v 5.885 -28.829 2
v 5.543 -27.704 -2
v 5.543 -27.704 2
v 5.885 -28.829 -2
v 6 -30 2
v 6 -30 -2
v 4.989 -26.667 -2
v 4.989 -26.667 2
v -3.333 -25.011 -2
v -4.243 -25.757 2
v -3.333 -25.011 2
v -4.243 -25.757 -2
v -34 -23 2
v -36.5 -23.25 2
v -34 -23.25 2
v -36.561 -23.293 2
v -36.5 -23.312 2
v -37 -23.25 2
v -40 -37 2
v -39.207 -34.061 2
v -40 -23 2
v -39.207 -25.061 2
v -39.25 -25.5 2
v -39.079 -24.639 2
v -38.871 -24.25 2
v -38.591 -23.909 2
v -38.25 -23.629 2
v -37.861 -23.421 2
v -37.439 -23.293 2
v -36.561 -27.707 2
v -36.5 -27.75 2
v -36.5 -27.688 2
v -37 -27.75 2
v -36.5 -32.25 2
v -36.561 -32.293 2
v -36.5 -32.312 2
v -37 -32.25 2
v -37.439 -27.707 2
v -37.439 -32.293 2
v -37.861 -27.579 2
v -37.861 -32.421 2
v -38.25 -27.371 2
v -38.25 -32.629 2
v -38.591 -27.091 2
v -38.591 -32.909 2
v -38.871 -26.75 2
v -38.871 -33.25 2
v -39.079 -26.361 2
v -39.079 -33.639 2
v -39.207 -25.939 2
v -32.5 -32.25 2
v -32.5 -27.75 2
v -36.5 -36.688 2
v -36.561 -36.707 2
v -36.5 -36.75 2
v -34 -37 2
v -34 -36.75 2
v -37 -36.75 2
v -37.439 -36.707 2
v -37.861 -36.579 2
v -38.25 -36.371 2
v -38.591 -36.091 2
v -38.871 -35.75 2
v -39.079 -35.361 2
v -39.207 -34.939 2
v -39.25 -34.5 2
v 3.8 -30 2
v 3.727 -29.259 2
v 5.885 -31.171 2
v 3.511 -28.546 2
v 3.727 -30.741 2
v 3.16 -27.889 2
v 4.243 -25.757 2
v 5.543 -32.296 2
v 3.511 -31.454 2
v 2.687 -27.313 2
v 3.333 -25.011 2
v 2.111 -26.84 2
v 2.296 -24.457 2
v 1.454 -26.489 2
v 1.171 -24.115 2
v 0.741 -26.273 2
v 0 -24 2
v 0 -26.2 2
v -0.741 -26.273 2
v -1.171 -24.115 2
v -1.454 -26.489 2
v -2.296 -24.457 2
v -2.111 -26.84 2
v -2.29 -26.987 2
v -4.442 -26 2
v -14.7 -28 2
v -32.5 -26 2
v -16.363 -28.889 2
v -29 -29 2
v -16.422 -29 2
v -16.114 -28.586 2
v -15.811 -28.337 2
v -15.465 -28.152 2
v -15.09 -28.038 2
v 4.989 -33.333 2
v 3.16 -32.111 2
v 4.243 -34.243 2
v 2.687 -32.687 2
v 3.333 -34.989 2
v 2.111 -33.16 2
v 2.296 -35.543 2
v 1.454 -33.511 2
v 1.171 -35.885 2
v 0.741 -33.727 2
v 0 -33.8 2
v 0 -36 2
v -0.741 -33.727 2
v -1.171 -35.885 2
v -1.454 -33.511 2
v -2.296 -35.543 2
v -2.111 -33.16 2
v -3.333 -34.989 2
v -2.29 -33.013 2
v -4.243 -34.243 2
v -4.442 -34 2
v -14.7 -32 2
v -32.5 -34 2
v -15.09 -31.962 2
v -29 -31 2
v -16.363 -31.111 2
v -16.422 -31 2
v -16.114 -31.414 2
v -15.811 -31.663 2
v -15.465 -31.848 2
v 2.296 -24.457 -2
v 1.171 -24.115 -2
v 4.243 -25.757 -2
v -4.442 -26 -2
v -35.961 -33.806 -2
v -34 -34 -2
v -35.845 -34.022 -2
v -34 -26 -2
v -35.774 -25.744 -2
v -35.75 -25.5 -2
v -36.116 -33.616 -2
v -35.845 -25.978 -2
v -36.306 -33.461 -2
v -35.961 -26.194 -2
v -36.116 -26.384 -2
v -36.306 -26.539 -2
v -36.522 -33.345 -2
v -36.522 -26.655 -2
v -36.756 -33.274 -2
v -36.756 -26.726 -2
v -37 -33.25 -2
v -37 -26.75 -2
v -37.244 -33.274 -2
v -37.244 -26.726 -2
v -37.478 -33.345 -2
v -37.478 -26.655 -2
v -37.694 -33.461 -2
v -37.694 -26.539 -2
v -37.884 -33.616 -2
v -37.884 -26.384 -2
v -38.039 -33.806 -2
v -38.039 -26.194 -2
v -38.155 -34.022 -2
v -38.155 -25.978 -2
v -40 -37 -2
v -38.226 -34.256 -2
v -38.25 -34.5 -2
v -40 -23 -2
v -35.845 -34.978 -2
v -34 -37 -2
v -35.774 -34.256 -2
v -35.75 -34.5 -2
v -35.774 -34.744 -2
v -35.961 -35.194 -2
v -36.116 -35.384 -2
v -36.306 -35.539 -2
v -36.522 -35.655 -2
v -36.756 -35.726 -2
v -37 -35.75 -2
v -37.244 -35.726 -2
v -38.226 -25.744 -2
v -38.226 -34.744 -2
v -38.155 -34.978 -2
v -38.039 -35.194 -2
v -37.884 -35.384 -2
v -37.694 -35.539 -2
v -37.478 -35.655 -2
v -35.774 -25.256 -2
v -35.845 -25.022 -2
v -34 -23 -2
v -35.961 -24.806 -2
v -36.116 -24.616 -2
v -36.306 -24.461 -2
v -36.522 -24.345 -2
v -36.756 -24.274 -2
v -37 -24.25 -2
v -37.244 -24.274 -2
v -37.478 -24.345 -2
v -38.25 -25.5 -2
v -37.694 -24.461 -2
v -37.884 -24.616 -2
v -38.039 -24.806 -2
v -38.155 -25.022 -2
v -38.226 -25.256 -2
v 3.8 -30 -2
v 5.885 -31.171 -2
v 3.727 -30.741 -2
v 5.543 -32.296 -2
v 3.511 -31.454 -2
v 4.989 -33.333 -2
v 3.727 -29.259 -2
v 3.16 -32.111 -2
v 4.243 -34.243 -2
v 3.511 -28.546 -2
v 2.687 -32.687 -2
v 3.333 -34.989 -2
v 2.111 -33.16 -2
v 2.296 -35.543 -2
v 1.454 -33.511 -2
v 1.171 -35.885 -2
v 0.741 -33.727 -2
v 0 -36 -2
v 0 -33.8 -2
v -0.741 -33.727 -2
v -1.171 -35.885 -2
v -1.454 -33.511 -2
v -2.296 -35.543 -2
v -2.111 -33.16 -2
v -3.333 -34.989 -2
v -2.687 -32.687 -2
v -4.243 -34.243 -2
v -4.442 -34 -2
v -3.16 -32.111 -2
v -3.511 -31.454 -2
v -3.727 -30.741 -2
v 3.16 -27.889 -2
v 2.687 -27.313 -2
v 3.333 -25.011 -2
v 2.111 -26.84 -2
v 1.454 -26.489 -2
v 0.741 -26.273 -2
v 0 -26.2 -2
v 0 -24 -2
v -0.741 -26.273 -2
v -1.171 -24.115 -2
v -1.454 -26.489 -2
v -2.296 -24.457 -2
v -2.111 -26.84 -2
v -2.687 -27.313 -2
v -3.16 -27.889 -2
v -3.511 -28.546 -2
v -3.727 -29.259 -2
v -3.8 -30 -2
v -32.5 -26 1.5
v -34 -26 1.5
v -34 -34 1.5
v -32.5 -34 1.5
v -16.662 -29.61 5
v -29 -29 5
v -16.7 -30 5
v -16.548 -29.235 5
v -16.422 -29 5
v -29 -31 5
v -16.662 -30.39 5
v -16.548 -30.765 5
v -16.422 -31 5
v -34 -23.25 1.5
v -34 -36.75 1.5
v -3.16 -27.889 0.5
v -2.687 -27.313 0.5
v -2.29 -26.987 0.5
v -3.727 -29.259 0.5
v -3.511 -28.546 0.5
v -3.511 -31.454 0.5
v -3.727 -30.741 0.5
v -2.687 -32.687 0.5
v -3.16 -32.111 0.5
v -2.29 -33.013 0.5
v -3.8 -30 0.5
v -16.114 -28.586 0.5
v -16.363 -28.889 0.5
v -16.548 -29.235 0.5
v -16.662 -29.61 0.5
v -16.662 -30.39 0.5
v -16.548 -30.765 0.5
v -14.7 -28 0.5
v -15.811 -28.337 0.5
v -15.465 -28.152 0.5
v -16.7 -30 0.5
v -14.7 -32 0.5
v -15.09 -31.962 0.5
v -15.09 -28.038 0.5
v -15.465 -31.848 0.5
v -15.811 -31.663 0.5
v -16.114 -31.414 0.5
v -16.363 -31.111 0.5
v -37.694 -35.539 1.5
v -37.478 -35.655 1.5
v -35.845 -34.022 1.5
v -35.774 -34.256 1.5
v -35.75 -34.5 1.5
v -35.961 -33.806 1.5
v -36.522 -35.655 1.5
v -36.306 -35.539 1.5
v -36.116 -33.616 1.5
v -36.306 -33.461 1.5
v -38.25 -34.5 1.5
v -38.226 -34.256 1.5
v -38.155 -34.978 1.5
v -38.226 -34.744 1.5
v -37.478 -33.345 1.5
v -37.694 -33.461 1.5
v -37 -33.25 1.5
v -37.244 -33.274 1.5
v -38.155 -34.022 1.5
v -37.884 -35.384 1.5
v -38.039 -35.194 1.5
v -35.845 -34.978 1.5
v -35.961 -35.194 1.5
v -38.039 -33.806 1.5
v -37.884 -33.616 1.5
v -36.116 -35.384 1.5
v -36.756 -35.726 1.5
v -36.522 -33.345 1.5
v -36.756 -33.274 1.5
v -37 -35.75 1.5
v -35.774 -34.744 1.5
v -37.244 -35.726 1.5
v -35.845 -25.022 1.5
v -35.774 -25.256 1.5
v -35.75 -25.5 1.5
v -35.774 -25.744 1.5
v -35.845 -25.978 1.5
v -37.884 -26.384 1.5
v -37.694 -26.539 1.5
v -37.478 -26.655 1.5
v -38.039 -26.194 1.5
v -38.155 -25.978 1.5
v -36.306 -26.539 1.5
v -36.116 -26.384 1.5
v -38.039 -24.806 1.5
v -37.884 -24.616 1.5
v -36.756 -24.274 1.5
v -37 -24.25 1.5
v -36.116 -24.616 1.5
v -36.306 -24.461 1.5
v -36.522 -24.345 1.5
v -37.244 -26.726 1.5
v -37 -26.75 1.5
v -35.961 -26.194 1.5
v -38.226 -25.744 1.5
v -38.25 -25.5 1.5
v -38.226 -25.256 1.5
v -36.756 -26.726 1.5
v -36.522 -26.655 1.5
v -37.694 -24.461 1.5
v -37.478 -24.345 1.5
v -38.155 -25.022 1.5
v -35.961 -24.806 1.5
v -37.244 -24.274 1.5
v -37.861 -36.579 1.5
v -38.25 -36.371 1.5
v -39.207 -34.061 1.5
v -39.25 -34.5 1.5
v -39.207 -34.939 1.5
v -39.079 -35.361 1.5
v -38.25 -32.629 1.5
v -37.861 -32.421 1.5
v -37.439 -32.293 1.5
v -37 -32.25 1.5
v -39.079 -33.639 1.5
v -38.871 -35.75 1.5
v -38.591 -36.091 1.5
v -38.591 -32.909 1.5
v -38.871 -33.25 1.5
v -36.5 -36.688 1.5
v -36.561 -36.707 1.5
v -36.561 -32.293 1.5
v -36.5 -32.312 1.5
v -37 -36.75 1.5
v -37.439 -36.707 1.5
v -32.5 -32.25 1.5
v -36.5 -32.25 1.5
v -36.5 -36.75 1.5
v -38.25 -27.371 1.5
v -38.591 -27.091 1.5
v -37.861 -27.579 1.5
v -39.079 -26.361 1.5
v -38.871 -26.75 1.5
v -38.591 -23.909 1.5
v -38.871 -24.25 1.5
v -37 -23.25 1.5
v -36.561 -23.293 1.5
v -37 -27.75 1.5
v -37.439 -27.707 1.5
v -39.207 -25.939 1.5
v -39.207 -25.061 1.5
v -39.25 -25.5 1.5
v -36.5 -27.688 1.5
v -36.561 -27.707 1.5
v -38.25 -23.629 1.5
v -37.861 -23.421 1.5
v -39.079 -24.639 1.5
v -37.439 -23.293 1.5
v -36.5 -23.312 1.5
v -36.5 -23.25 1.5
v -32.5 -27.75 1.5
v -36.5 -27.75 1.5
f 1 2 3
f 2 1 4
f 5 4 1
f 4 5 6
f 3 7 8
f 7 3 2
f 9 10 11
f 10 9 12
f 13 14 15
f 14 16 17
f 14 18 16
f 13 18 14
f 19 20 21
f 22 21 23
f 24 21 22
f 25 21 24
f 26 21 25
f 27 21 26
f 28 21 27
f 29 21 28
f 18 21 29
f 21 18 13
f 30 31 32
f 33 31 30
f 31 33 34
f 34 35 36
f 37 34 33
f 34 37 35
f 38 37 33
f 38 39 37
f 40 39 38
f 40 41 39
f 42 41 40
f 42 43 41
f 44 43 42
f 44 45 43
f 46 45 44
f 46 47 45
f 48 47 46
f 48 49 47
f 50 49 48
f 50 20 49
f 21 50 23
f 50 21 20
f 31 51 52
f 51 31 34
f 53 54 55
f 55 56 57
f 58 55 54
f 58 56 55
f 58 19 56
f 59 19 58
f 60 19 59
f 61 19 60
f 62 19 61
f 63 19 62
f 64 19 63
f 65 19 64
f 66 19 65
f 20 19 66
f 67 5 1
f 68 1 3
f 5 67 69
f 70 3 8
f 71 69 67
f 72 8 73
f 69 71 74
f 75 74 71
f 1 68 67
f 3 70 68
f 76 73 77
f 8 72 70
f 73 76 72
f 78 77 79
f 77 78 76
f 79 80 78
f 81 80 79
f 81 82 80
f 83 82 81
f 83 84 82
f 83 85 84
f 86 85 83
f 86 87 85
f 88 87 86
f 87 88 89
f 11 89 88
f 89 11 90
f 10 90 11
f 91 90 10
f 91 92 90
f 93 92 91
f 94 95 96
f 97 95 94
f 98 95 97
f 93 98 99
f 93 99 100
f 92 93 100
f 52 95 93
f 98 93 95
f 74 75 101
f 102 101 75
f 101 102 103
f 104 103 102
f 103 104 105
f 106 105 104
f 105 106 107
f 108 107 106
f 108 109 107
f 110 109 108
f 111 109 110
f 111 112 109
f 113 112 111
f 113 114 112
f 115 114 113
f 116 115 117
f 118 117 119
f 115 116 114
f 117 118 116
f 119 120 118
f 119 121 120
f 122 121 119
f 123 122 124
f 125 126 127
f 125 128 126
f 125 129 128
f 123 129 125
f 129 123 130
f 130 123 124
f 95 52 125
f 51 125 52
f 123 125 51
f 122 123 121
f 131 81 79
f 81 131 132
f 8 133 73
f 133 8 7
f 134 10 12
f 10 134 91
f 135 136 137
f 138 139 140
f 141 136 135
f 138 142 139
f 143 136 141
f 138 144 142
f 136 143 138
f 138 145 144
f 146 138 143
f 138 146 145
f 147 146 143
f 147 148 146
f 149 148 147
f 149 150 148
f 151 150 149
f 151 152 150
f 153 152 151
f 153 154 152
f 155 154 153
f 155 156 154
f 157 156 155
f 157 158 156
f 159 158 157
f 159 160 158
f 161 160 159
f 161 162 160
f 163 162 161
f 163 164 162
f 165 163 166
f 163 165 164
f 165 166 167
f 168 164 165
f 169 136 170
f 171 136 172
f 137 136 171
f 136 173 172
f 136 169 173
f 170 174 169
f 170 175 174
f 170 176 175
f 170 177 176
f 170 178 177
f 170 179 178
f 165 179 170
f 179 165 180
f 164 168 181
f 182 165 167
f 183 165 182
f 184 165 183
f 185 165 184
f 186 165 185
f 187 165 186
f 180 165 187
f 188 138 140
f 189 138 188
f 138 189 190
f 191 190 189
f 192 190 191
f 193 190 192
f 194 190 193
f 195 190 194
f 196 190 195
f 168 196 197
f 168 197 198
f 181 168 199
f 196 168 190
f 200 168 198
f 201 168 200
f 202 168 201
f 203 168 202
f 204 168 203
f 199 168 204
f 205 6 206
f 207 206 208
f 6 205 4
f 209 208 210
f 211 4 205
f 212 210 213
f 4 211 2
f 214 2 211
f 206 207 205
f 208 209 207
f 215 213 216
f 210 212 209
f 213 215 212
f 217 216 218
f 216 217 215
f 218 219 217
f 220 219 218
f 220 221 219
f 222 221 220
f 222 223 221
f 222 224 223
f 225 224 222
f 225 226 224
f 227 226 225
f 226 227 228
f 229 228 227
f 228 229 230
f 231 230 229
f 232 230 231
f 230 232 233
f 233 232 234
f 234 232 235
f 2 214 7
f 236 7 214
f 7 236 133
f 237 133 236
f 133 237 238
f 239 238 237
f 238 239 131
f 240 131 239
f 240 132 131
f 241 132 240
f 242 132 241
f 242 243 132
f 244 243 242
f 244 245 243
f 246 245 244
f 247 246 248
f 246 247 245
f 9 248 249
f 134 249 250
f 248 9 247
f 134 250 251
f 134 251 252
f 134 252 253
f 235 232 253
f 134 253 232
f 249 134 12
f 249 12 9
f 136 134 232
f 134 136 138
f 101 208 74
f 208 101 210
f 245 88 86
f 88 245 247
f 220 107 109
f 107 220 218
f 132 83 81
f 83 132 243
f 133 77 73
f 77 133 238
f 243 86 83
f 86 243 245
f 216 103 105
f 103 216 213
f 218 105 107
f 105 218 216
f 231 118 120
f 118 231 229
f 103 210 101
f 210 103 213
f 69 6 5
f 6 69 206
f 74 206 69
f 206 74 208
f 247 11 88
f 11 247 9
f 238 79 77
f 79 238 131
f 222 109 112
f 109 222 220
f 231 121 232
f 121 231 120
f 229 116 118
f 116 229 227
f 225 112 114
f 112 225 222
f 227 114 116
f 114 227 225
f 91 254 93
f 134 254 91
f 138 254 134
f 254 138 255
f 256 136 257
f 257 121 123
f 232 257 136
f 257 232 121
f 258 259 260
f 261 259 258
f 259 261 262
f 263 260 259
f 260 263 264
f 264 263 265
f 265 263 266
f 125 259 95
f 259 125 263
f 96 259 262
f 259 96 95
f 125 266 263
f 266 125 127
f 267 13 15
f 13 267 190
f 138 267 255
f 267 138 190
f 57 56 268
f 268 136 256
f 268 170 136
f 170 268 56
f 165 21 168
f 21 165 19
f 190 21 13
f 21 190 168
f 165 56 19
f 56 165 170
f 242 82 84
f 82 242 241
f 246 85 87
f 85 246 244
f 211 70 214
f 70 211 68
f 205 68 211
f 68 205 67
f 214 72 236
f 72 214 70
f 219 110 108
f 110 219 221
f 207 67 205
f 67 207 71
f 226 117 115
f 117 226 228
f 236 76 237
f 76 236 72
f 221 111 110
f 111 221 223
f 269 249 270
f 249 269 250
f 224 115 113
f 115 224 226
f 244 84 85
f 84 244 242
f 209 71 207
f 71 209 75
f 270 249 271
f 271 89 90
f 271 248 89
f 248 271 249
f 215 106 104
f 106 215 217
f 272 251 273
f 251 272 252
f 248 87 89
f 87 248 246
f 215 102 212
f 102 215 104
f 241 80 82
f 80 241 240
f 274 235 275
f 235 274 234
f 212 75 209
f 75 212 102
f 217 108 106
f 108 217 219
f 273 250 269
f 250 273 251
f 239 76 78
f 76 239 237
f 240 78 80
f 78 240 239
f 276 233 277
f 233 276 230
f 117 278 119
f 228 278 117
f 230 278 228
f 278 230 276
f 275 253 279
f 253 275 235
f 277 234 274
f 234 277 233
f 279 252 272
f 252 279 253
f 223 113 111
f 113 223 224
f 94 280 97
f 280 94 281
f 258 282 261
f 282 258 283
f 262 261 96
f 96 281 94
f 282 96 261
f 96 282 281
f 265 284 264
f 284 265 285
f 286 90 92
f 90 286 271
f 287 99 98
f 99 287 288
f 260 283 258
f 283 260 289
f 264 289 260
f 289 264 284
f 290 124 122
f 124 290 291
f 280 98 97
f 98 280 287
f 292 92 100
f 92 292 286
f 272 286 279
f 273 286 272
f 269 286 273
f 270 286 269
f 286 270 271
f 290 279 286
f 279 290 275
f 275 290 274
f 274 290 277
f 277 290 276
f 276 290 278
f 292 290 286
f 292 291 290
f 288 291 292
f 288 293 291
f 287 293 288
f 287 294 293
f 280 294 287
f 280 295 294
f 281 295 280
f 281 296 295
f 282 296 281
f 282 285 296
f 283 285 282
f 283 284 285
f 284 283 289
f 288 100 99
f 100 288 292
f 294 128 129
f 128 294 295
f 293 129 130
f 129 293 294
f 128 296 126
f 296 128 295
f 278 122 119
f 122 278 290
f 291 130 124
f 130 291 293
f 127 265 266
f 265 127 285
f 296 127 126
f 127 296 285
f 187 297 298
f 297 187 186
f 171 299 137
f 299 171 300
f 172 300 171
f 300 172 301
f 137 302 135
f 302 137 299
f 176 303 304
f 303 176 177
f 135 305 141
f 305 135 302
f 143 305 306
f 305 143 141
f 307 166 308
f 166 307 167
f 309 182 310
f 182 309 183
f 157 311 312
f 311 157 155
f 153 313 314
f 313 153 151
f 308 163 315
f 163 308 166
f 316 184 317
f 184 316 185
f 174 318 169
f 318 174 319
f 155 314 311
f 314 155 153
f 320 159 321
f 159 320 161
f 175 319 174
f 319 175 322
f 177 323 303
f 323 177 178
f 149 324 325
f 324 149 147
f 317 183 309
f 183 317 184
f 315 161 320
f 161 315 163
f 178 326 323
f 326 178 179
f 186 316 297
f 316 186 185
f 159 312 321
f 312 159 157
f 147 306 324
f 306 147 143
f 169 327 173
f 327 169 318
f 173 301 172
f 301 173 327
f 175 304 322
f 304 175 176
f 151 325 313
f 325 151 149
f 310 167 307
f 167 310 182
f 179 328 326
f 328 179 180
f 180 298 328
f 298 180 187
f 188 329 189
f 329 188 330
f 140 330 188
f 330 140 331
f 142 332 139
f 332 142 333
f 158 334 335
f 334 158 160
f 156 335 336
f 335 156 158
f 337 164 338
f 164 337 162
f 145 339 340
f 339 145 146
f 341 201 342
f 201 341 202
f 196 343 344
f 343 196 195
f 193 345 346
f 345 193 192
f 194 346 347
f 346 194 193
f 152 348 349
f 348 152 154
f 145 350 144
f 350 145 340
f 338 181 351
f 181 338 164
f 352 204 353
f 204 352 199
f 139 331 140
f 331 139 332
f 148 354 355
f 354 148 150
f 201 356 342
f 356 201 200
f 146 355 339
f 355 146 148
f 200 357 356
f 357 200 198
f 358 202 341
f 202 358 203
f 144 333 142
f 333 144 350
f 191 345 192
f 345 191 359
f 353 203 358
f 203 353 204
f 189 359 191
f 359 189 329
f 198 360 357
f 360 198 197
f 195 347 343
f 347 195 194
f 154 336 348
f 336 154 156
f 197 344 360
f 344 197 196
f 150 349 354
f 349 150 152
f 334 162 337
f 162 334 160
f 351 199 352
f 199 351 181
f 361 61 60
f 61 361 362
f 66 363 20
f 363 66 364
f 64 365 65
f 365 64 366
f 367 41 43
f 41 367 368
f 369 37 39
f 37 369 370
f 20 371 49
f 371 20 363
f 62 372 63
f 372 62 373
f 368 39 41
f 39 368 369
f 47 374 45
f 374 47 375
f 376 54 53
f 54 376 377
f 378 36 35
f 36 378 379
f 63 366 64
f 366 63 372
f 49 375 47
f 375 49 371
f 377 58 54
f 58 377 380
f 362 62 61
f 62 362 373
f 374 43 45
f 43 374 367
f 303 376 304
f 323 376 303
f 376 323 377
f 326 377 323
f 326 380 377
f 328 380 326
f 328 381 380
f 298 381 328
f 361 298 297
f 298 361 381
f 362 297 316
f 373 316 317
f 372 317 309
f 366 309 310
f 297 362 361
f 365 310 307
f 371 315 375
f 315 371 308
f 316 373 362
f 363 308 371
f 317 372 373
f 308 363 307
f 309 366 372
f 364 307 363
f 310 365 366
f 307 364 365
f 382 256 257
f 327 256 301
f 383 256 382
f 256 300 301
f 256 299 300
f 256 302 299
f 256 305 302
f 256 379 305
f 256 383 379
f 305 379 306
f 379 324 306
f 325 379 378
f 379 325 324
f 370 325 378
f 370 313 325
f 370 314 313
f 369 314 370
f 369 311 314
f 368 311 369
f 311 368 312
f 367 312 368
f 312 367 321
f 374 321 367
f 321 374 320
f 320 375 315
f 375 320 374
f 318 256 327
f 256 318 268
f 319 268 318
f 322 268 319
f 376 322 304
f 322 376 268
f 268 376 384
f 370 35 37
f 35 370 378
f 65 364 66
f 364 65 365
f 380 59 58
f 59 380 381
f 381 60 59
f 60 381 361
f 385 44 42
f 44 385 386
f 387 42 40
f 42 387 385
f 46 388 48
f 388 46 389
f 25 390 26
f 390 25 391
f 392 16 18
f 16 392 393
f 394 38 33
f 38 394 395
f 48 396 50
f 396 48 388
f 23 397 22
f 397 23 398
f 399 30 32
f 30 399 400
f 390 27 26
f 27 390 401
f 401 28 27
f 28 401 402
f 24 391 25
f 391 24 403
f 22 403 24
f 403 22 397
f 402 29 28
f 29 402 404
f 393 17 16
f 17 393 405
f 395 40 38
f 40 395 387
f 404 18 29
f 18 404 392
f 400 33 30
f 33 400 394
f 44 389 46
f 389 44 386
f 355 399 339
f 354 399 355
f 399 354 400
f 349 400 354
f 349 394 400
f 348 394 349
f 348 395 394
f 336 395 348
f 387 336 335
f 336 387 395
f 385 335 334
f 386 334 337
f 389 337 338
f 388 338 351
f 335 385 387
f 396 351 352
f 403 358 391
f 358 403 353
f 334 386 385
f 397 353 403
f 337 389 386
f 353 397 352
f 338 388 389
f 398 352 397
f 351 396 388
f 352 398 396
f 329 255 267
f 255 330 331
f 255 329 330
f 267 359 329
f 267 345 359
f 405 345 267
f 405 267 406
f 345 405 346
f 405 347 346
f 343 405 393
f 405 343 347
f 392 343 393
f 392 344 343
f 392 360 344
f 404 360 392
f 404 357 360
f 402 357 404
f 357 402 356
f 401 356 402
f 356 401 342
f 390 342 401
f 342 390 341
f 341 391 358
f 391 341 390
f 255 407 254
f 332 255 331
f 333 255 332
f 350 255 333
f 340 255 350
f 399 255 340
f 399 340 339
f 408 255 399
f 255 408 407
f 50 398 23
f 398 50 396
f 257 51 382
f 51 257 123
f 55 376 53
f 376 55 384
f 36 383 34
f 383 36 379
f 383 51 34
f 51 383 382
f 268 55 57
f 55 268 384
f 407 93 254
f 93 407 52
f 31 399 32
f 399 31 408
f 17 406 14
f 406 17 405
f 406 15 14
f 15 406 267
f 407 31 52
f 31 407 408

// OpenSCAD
//-- limit switch holder / servo arm extender for Auto Bed Leveling
//-- by AndrewBCN - Barcelona, Spain - November 2014
//-- GPLV3
//-- (armv3 below)

//-- remix of Thingiverse #167430 (armv1 below)
//-- by zennmaster

//-- remix of Thingiverse #209384 (armv2 below)
//-- by Stephen Castello

//--remix of Thingiverse #573181 (Added switch_holes and diameter variable to allow for different-size switches)
//-- by Atrixium

// Some measurements and features

// armv1 has a (fixed) length of 37mm,
// width is 10mm, thickness is 4mm,
// uses 2 x M2.5 screws and nuts to hold a small limit switch.
// Uses standard 9G microservo.

// armv2 is for a much larger limit switch and also
// apparently for a larger servo, although everything seems
// to be configurable. Default thickness is 5mm.
// Uses M3 screws and nuts to hold the limit switch.

// armv3 has a parametric length (default is 37mm), uses
// a T-profile with 4mm base thickness to avoid flexing,
// holds the small limit switch with either 2 x small M2.5
// screws and nuts or a nylon tie.
// Uses standard 9G microservo.
// The slot for the servo arm is properly shaped.


// arm body length, add approximately 8mm for total length
// i.e. with an arm length of 37mm, the distance between
// the servo center and the tip of the limit switch is 45mm

// Configure according to your extruder dimensions
arm_length=37; // [30:70]
// Limit switch hole spacing between centers
switch_holes=9; //[1:15]
// Limit switch hole diameter
diameter=2.5; //[0:4]

module armv3() {
    difference() {
      // body
      union() {
      cylinder(r=6, h=4,center=true,$fn=32);
      translate([-arm_length/2,0,0]) cube([arm_length,8,4],center=true);
      // reinforcement
      translate([-arm_length/2,0,3]) cube([arm_length-16,2,4],center=true);
      // limit switch base
      translate([-arm_length,0,0]) cube([6,5+switch_holes,4],center=true);
      }
      
    // hole for servo spindle
    cylinder(r=3.8,h=10,center=true,$fn=32); 

    // slot for servo arm
    hull() {
      translate([0,0,5.5]) cylinder(r=3.2,h=10,center=true,$fn=32);
      translate([-14.7,0,5.5]) cylinder(r=2,h=10,center=true,$fn=32);
    }
    
    // holes for nylon tie or M2.5 screws holding limit switch
    translate([-arm_length,switch_holes/-2,0]) cylinder(r=diameter/2,h=10,center=true,$fn=32);
    translate([-arm_length,switch_holes/2,0]) cylinder(r=diameter/2,h=10,center=true,$fn=32);
    
    // some limit switches will fit better with this
    translate([-arm_length,switch_holes/-2,4]) cylinder(r=diameter/2+1,h=5,center=true,$fn=32);
    translate([-arm_length,switch_holes/2,4]) cylinder(r=diameter/2+1,h=5,center=true,$fn=32);    
    translate([-arm_length+2.5,switch_holes/-2,4]) cube([4,diameter+2,5],center=true);
    translate([-arm_length+2.5,switch_holes/2,4]) cube([4,diameter+2,5],center=true);    
    }
}


module armv1() {
  difference(){
    union(){
      difference(){
	roundedBox([10,37,4],4,true); //main body
	translate([0,0,3])
	  roundedBox([4.8,28,5],2.4,true);  //slot for servo arm
	translate([0,-12.5,-5])
	cylinder(r=3.75,h=10, $fn=30); //  Hole for servo spindle
      }

      translate([0,16.5,0])
      roundedBox([20,5,4],1.75,true); // Microswtich mount body
    }
    translate([0,16.5,-1])
    roundedBox([16,2.8,10],1.4,true);  // slot for mounting screws
  }
}

module armv2() {
  //////////////////////////////////////////////////////////////////////////////////////////////////
  // Created on 12/13/2013 by Stephen Castello
  // Last update: 2/22/2014
  // changed thickness to 5mm (4mm flexed alot)
  //////////////////////////////////////////////////////////////////////////////////////////////////
  // variables
  //////////////////////////////////////////////////////////////////////////////////////////////////
  Z_Rod_dia=10;				// diameter of Z rod
  Screw_dia=3.2;				// clamp screw diameter
  Screw_Thread_dia=2.5;		// screw hole diameter to make a 3mm threaded hole
  Switch_ht=15;				// height of holder
  Switch_thk = 5;				// thickness of holder
  Switch_hole_sep=22;		// distance between holes for switch (19 for mechanical endstop v1.2)
  Switch_hole_offset = 10;		// switch hole offest (mech endstop v1.2 doesn't have one)
  Nut_wrench_size = 5.5;		// wrench size of nut
  Nut_depth = 2.3;			// thickness of nut
  Nylok_depth = 4;			// thickness of nylok nut
  Lever_wd = 12;				// width of lever
  Lever_ht = 33;				// lever length
  Servo_dia = 8.2;			// outside diameter of servo lever
  //////////////////////////////////////////////////////////////////////////////////////////////////
  // make the parts
  //////////////////////////////////////////////////////////////////////////////////////////////////

  rotate([0,-90,0]) {
	  switch_side(0); // switch off to right == 1
	  lever();
  }

  //////////////////////////////////////////////////////////////////////////////////////////////////
  // modules for each part
  //////////////////////////////////////////////////////////////////////////////////////////////////

  module switch_side(Right) { // riser for switch
	  if(Right) {
		  difference() {
			  difference() {
				  difference() {
					  cube([Switch_thk,29,Switch_ht],false);
					  // screw holes for switch
					  rotate(a=[0,90,0]) {		
						  translate([-(Switch_ht-2.5), 4, 0]) {
							  cylinder(h = 11, r = Screw_dia/2, center = false, $fn=100);
						  }
					  }
					  rotate(a=[0,90,0]) {
						  translate(v = [-(Switch_ht-2.5)+Switch_hole_offset, 4+Switch_hole_sep, 0]) {
						  cylinder(h = 11, r = Screw_dia/2, center = false, $fn=100);
						  }
					  }
				  }
			  }
		  }
		  translate([0,12,11]) rotate([45,0,0]) cube([Switch_thk,5,5],false); // gusset
	  } else {
		  difference() {
			  difference() {
				  translate([0,-17,0]) {
					  difference() {
						  cube([Switch_thk,29,Switch_ht],false);
						  // screw holes for switch
						  rotate(a=[0,90,0]) {		
							  translate([-(Switch_ht-2.5)+Switch_hole_offset, 4, 0]) {
								  cylinder(h = 11, r = Screw_dia/2, center = false, $fn=100);
							  }
						  }
						  rotate(a=[0,90,0]) {
							  translate(v = [-(Switch_ht-2.5), 4+Switch_hole_sep, 0]) {
							  cylinder(h = 11, r = Screw_dia/2, center = false, $fn=100);
							  }
						  }
					  }
				  } // translate
			  }
		  }
		  translate([0,0,11]) rotate([45,0,0]) cube([Switch_thk,5,5],false); // gusset
	  }
  }

  //////////////////////////////////////////////////////////////////////////////////////////////////////////////

  module lever() {  // servo lever
	  difference() {
		  hull() {
			  translate([0,0,15]) cube([Switch_thk,Lever_wd,Lever_ht-5],false); // lever with a rounded end
			  translate([0,6,Lever_ht + 10.5]) rotate([0,90,0]) cylinder(h=Switch_thk,r=Lever_wd/2,$fn=50);
		  }
		  translate([2.6,3,15]) cube([Switch_thk/2,Lever_wd/2,Lever_ht-5],false); // groove
		  translate([-5,6,Lever_ht + 10]) rotate([0,90,0]) cylinder(h=20,r=Servo_dia/2,$fn=50); // servo arm hole
		  //notch_lever();  // added countersinks instead
	  }
  }

  //////////////////////////////////////////////////////////////////////////////////////////////////////////////

  module notch_lever()
  {
	  difference() { // space for servo mounting screw
		  hull() {   // must be adjusted if size is changed *************************************************************
			  translate([-1,15,35]) rotate([90,0,0]) cylinder(h=20,r=2,$fn=50);
			  translate([-1,23,50]) rotate([135,0,0]) cylinder(h=20,r=2,$fn=50);
			  translate([-1,3,36]) rotate([45,0,0]) cylinder(h=20,r=2,$fn=50);
		  }
		  translate([-1,6,47]) {
			  rotate([0,90,0]) minkowski() {
				  cube([Lever_wd-4,Switch_thk-4,Lever_ht], true);
				  cylinder(r=6,h=1,$fn=100);
			  }
		  }
	  }
  }

  //////////////////////end of Z stop servo mount.scad /////////////////////////////////////////////////
}

/*include <boxes.scad>; // required only by armv1
armv1();
translate([30,30,0]) armv2(); */
// print the part
translate([0,-30,0]) armv3();
